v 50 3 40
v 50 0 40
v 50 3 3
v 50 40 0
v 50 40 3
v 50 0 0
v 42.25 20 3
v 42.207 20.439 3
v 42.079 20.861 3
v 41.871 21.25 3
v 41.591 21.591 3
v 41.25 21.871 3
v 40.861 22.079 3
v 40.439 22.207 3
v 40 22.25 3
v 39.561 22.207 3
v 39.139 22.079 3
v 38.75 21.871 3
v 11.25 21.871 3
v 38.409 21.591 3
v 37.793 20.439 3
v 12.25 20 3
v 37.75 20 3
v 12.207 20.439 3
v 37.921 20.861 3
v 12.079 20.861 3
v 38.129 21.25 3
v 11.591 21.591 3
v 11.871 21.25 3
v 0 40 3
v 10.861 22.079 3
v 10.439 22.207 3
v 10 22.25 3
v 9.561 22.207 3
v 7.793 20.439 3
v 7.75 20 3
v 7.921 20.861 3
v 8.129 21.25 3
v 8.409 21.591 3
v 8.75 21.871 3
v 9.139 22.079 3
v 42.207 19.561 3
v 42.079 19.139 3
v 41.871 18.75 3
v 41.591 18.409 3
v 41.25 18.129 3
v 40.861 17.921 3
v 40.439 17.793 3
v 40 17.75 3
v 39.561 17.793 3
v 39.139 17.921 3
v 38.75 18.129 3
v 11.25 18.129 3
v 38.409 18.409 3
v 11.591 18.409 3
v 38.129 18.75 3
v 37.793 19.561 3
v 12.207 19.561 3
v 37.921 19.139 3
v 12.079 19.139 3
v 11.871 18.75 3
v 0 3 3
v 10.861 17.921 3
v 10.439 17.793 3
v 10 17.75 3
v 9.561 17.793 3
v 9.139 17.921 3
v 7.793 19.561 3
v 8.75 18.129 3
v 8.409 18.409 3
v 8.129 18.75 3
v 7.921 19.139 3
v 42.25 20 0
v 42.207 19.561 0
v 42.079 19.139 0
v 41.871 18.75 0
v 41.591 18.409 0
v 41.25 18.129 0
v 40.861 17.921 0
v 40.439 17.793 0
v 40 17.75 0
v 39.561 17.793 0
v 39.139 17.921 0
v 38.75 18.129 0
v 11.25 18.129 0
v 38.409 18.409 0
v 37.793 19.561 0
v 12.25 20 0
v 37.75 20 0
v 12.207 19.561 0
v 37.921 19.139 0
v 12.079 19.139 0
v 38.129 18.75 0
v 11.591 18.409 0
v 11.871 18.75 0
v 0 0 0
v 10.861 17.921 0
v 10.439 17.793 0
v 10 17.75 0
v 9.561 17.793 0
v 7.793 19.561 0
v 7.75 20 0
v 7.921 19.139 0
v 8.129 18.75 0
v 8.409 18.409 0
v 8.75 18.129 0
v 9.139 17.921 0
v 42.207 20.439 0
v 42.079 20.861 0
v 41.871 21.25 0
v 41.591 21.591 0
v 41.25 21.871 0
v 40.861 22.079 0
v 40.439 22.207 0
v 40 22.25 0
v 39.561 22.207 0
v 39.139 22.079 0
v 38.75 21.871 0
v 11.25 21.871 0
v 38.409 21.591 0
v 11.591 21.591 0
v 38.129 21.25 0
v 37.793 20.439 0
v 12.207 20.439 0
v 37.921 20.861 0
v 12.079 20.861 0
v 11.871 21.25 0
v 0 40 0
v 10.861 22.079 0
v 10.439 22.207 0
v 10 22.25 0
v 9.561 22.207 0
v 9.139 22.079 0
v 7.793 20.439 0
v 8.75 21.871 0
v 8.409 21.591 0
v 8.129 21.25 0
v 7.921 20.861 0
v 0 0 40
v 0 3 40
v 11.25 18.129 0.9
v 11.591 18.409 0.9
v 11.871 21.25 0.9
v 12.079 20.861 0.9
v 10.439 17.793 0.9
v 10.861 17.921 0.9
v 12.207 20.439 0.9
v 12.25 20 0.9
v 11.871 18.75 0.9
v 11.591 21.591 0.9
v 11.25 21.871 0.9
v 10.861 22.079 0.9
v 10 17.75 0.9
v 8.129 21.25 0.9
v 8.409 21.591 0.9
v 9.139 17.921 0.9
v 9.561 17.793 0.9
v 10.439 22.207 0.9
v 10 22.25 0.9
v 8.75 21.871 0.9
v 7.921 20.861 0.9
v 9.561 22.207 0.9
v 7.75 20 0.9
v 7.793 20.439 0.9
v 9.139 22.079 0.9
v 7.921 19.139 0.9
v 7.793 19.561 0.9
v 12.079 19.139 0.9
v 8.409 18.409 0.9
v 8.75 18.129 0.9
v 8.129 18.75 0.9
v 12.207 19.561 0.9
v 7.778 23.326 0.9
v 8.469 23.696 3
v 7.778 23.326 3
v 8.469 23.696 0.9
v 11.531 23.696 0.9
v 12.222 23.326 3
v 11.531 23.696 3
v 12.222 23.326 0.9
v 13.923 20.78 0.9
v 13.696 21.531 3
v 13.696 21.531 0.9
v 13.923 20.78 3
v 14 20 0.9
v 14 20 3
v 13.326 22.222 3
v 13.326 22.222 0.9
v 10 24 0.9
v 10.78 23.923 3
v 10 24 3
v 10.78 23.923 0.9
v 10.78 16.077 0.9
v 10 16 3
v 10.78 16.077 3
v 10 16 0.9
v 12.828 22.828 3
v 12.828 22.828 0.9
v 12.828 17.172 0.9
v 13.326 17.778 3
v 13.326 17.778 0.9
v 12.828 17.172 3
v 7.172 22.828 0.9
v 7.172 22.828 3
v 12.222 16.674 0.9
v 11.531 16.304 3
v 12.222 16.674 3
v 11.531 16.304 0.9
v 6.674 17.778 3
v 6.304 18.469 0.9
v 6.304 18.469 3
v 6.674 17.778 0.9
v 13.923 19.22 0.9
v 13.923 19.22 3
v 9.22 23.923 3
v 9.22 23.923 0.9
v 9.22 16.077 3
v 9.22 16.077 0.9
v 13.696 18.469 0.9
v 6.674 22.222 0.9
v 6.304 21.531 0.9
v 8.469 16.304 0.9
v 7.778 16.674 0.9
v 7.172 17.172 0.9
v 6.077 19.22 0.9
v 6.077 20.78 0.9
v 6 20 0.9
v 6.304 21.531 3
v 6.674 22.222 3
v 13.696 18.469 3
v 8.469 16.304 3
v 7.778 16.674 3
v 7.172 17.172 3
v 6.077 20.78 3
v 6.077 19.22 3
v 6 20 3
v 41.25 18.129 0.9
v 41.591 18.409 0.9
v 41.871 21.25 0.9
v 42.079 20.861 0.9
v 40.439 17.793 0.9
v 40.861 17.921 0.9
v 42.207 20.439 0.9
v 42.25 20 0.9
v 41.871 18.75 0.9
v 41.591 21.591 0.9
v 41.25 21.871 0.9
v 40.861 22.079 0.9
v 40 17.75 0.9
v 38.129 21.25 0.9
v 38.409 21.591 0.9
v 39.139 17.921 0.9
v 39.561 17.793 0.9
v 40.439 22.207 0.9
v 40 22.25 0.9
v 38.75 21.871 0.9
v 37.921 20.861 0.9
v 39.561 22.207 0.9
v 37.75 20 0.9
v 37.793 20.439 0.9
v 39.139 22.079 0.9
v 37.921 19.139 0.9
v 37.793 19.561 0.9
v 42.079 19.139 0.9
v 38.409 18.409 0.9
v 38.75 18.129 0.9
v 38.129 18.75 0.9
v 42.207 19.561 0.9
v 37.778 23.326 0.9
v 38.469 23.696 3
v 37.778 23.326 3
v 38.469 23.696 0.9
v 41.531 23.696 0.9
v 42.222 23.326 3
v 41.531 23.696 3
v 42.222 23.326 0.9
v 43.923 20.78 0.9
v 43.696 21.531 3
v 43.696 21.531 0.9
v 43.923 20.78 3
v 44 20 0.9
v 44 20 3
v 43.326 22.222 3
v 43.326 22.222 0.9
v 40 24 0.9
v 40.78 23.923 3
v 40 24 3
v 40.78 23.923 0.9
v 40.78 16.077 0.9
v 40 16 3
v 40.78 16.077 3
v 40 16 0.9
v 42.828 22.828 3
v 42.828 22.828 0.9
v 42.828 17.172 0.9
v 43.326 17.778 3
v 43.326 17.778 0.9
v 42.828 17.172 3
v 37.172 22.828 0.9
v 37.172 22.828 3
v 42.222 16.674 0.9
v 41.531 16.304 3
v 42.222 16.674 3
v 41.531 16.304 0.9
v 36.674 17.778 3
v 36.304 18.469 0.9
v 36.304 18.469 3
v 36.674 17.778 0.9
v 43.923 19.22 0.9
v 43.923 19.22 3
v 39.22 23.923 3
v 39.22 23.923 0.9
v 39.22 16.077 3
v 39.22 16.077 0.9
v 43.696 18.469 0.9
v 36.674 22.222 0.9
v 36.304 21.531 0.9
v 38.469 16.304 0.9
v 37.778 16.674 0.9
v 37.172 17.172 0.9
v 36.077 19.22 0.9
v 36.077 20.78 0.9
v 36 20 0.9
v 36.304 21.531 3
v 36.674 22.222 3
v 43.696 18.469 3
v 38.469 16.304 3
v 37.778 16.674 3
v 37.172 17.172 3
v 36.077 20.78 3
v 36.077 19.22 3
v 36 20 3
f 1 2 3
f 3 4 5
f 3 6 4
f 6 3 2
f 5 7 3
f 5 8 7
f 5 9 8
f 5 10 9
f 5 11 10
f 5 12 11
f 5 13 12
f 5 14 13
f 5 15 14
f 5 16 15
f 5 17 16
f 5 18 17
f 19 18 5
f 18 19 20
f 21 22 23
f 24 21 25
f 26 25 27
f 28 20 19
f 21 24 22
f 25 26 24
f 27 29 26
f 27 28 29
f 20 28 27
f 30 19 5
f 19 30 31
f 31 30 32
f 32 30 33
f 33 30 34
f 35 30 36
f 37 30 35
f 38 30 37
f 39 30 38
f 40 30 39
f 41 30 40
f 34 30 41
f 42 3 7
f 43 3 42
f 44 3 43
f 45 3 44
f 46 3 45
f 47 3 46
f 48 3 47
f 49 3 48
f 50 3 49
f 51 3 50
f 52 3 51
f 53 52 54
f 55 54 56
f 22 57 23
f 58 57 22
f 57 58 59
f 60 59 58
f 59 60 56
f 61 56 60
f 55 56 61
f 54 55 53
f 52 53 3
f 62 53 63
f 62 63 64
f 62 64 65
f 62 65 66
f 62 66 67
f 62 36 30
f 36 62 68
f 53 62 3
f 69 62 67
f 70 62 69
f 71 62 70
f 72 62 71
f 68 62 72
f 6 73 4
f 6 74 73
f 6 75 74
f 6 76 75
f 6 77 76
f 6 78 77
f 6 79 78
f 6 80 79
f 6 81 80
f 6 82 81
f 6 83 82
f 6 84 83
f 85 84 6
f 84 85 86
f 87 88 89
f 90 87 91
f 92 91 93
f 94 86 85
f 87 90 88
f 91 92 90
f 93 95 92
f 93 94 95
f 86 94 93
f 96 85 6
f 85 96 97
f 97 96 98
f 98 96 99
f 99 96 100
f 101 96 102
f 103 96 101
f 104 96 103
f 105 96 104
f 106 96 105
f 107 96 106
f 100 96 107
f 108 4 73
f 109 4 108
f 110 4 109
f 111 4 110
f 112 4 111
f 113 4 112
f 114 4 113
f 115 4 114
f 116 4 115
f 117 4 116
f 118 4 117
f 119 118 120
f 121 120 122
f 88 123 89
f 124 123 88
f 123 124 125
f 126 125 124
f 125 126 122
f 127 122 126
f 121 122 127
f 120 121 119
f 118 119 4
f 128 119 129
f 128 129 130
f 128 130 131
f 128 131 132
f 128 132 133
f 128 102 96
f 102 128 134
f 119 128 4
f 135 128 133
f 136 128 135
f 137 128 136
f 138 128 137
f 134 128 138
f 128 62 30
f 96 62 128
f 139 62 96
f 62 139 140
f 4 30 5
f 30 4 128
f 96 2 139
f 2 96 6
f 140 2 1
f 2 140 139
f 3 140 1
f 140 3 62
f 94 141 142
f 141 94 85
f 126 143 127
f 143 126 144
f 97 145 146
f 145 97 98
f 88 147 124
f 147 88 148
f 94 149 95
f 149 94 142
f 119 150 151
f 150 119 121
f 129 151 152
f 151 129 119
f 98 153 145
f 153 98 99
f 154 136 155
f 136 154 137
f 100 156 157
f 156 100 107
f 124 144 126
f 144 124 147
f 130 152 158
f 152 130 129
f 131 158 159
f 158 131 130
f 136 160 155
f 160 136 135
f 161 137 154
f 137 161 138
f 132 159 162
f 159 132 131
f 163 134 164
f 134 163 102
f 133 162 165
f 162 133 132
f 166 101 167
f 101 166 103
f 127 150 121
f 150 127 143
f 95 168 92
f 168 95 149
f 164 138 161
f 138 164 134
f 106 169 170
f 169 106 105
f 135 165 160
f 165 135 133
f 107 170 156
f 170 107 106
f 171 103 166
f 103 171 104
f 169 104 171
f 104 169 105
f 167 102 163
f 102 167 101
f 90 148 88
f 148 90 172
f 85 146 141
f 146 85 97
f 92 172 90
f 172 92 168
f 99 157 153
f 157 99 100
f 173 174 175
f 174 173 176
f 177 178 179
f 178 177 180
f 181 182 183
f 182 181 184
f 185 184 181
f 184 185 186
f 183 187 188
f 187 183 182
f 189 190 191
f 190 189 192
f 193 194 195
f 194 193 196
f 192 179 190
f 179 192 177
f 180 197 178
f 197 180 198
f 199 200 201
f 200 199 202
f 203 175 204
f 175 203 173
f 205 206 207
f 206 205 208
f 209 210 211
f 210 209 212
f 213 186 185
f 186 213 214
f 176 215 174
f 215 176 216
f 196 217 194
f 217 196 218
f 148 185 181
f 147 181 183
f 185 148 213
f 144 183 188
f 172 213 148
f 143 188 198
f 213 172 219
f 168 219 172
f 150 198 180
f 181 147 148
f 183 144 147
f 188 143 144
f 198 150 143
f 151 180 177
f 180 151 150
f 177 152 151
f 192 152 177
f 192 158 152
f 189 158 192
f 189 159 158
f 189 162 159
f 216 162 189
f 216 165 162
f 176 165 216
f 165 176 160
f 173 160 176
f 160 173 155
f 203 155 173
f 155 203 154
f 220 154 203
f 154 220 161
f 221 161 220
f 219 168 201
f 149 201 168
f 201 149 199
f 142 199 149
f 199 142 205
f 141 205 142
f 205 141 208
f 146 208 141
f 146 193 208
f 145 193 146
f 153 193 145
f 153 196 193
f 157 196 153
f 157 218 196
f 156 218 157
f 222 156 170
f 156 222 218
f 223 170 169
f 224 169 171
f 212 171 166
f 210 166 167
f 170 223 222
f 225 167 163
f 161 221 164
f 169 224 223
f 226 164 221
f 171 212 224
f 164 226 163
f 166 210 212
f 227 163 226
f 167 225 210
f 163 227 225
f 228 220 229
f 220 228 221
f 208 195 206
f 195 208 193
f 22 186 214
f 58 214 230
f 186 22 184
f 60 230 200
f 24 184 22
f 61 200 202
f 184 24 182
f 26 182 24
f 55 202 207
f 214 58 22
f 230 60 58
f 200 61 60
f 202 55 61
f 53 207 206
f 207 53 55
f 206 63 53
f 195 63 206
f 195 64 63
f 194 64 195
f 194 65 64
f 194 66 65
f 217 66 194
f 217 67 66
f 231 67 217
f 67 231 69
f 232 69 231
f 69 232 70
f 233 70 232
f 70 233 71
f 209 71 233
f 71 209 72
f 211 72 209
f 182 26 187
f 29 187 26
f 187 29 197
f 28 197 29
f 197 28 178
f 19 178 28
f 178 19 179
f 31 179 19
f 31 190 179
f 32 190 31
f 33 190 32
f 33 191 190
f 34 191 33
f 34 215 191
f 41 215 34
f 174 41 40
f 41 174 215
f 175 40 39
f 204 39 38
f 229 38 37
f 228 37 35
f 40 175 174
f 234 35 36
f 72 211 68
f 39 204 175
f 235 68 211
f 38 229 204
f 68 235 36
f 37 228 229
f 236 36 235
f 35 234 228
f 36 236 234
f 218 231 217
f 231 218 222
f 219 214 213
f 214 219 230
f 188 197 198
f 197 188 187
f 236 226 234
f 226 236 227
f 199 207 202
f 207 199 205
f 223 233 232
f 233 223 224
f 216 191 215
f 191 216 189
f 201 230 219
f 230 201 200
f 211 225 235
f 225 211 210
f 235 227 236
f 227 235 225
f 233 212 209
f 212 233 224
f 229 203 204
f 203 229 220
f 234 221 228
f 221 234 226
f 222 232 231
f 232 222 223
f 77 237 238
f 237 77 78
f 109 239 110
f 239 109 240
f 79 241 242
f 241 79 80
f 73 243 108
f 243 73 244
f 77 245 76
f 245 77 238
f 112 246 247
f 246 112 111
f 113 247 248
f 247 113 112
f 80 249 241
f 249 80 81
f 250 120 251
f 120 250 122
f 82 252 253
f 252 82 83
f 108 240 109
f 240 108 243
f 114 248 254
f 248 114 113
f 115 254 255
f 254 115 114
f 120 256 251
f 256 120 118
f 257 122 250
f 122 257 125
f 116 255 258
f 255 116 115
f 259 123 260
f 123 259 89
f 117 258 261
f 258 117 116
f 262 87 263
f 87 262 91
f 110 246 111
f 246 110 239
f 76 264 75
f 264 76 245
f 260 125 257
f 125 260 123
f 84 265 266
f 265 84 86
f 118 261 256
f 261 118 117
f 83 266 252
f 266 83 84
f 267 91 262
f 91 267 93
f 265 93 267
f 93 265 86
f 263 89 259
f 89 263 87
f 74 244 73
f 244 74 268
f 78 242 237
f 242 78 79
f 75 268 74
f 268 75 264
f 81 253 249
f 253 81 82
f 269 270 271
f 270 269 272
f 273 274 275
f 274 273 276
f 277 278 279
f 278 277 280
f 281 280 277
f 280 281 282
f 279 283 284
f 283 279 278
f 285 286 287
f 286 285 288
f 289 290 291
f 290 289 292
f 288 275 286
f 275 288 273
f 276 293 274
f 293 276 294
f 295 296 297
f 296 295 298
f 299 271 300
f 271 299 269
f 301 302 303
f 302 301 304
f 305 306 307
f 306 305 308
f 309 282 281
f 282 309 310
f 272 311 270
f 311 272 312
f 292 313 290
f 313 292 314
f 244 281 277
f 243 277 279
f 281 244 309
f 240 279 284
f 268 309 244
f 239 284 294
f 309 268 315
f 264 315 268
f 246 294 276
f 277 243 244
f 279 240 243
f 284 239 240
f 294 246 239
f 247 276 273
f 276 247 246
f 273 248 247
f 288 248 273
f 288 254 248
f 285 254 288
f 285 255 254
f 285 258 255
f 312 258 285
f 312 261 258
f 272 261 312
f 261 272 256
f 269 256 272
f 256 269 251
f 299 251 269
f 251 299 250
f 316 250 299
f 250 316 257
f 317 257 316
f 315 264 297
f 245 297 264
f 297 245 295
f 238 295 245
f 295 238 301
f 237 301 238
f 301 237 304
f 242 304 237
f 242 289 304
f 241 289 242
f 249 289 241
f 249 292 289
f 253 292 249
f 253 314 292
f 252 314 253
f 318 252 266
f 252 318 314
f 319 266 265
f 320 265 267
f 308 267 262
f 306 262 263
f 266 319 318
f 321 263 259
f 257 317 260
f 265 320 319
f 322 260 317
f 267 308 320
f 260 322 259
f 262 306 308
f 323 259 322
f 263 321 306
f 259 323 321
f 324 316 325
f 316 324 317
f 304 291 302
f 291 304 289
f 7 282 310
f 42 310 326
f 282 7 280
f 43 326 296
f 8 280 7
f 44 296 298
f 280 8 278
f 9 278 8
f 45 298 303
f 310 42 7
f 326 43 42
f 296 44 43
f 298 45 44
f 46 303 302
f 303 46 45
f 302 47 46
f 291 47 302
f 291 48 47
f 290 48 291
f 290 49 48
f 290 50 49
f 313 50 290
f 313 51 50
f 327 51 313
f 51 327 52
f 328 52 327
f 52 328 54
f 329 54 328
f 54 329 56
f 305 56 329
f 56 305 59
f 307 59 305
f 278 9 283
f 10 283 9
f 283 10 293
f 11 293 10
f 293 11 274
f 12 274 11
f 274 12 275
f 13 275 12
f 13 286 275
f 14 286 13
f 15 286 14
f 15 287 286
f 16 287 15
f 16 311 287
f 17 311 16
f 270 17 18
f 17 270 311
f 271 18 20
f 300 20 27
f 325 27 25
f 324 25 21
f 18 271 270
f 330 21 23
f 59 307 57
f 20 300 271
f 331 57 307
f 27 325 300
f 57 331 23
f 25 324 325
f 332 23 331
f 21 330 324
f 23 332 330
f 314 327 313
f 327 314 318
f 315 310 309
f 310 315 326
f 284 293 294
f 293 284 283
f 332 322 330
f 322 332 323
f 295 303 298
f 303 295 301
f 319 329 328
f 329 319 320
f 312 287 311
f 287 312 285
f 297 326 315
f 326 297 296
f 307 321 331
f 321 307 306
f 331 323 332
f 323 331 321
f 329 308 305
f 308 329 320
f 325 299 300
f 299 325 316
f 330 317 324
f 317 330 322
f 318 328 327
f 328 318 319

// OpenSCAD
// L-bracket with countersunk holes

// Parameters
horizontal_width = 50;  // mm
horizontal_depth = 40;  // mm
vertical_width = 50;    // mm
vertical_height = 40;   // mm
thickness = 3;          // mm

// Hole parameters
hole_diameter = 4.5;    // mm
countersink_diameter = 8;  // mm
countersink_depth = 2;  // mm
hole_offset_from_edge = 10;  // mm from edge

// Countersunk hole - drilled from one side, countersink on the other side
module countersunk_hole_horizontal() {
    // Through hole
    cylinder(h = thickness + 0.2, r = hole_diameter / 2, center = false, $fn = 32);
    
    // Countersink on top (Z+ direction)
    translate([0, 0, thickness - countersink_depth])
        cylinder(h = countersink_depth + 0.1, r = countersink_diameter / 2, center = false, $fn = 32);
}

module countersunk_hole_vertical() {
    // Through hole
    cylinder(h = thickness + 0.2, r = hole_diameter / 2, center = false, $fn = 32);
    
    // Countersink on front (Y- direction)
    translate([0, -countersink_depth, 0])
        cylinder(h = countersink_depth + 0.1, r = countersink_diameter / 2, center = false, $fn = 32);
}

// Main L-bracket shape
module l_bracket() {
    // Horizontal flange (XY plane, at Z=0 to Z=thickness)
    cube([horizontal_width, horizontal_depth, thickness]);
    
    // Vertical flange (XZ plane, at Y=0 to Y=thickness)
    cube([vertical_width, thickness, vertical_height]);
}

// Holes for horizontal flange (top side, countersink facing up +Z)
module horizontal_flange_holes() {
    hole_y = horizontal_depth / 2;
    
    // Left hole
    hole_x_left = hole_offset_from_edge;
    translate([hole_x_left, hole_y, -0.1]) {
        countersunk_hole_horizontal();
    }
    
    // Right hole
    hole_x_right = horizontal_width - hole_offset_from_edge;
    translate([hole_x_right, hole_y, -0.1]) {
        countersunk_hole_horizontal();
    }
}

// Holes for vertical flange (front side, countersink facing outward -Y)
module vertical_flange_holes() {
    hole_x = vertical_width / 2;
    
    // Bottom hole
    hole_z_bottom = hole_offset_from_edge;
    translate([hole_x, -0.1, hole_z_bottom]) {
        rotate([90, 0, 0])
            countersunk_hole_vertical();
    }
    
    // Top hole
    hole_z_top = vertical_height - hole_offset_from_edge;
    translate([hole_x, -0.1, hole_z_top]) {
        rotate([90, 0, 0])
            countersunk_hole_vertical();
    }
}

// Main assembly
difference() {
    l_bracket();
    horizontal_flange_holes();
    vertical_flange_holes();
}
